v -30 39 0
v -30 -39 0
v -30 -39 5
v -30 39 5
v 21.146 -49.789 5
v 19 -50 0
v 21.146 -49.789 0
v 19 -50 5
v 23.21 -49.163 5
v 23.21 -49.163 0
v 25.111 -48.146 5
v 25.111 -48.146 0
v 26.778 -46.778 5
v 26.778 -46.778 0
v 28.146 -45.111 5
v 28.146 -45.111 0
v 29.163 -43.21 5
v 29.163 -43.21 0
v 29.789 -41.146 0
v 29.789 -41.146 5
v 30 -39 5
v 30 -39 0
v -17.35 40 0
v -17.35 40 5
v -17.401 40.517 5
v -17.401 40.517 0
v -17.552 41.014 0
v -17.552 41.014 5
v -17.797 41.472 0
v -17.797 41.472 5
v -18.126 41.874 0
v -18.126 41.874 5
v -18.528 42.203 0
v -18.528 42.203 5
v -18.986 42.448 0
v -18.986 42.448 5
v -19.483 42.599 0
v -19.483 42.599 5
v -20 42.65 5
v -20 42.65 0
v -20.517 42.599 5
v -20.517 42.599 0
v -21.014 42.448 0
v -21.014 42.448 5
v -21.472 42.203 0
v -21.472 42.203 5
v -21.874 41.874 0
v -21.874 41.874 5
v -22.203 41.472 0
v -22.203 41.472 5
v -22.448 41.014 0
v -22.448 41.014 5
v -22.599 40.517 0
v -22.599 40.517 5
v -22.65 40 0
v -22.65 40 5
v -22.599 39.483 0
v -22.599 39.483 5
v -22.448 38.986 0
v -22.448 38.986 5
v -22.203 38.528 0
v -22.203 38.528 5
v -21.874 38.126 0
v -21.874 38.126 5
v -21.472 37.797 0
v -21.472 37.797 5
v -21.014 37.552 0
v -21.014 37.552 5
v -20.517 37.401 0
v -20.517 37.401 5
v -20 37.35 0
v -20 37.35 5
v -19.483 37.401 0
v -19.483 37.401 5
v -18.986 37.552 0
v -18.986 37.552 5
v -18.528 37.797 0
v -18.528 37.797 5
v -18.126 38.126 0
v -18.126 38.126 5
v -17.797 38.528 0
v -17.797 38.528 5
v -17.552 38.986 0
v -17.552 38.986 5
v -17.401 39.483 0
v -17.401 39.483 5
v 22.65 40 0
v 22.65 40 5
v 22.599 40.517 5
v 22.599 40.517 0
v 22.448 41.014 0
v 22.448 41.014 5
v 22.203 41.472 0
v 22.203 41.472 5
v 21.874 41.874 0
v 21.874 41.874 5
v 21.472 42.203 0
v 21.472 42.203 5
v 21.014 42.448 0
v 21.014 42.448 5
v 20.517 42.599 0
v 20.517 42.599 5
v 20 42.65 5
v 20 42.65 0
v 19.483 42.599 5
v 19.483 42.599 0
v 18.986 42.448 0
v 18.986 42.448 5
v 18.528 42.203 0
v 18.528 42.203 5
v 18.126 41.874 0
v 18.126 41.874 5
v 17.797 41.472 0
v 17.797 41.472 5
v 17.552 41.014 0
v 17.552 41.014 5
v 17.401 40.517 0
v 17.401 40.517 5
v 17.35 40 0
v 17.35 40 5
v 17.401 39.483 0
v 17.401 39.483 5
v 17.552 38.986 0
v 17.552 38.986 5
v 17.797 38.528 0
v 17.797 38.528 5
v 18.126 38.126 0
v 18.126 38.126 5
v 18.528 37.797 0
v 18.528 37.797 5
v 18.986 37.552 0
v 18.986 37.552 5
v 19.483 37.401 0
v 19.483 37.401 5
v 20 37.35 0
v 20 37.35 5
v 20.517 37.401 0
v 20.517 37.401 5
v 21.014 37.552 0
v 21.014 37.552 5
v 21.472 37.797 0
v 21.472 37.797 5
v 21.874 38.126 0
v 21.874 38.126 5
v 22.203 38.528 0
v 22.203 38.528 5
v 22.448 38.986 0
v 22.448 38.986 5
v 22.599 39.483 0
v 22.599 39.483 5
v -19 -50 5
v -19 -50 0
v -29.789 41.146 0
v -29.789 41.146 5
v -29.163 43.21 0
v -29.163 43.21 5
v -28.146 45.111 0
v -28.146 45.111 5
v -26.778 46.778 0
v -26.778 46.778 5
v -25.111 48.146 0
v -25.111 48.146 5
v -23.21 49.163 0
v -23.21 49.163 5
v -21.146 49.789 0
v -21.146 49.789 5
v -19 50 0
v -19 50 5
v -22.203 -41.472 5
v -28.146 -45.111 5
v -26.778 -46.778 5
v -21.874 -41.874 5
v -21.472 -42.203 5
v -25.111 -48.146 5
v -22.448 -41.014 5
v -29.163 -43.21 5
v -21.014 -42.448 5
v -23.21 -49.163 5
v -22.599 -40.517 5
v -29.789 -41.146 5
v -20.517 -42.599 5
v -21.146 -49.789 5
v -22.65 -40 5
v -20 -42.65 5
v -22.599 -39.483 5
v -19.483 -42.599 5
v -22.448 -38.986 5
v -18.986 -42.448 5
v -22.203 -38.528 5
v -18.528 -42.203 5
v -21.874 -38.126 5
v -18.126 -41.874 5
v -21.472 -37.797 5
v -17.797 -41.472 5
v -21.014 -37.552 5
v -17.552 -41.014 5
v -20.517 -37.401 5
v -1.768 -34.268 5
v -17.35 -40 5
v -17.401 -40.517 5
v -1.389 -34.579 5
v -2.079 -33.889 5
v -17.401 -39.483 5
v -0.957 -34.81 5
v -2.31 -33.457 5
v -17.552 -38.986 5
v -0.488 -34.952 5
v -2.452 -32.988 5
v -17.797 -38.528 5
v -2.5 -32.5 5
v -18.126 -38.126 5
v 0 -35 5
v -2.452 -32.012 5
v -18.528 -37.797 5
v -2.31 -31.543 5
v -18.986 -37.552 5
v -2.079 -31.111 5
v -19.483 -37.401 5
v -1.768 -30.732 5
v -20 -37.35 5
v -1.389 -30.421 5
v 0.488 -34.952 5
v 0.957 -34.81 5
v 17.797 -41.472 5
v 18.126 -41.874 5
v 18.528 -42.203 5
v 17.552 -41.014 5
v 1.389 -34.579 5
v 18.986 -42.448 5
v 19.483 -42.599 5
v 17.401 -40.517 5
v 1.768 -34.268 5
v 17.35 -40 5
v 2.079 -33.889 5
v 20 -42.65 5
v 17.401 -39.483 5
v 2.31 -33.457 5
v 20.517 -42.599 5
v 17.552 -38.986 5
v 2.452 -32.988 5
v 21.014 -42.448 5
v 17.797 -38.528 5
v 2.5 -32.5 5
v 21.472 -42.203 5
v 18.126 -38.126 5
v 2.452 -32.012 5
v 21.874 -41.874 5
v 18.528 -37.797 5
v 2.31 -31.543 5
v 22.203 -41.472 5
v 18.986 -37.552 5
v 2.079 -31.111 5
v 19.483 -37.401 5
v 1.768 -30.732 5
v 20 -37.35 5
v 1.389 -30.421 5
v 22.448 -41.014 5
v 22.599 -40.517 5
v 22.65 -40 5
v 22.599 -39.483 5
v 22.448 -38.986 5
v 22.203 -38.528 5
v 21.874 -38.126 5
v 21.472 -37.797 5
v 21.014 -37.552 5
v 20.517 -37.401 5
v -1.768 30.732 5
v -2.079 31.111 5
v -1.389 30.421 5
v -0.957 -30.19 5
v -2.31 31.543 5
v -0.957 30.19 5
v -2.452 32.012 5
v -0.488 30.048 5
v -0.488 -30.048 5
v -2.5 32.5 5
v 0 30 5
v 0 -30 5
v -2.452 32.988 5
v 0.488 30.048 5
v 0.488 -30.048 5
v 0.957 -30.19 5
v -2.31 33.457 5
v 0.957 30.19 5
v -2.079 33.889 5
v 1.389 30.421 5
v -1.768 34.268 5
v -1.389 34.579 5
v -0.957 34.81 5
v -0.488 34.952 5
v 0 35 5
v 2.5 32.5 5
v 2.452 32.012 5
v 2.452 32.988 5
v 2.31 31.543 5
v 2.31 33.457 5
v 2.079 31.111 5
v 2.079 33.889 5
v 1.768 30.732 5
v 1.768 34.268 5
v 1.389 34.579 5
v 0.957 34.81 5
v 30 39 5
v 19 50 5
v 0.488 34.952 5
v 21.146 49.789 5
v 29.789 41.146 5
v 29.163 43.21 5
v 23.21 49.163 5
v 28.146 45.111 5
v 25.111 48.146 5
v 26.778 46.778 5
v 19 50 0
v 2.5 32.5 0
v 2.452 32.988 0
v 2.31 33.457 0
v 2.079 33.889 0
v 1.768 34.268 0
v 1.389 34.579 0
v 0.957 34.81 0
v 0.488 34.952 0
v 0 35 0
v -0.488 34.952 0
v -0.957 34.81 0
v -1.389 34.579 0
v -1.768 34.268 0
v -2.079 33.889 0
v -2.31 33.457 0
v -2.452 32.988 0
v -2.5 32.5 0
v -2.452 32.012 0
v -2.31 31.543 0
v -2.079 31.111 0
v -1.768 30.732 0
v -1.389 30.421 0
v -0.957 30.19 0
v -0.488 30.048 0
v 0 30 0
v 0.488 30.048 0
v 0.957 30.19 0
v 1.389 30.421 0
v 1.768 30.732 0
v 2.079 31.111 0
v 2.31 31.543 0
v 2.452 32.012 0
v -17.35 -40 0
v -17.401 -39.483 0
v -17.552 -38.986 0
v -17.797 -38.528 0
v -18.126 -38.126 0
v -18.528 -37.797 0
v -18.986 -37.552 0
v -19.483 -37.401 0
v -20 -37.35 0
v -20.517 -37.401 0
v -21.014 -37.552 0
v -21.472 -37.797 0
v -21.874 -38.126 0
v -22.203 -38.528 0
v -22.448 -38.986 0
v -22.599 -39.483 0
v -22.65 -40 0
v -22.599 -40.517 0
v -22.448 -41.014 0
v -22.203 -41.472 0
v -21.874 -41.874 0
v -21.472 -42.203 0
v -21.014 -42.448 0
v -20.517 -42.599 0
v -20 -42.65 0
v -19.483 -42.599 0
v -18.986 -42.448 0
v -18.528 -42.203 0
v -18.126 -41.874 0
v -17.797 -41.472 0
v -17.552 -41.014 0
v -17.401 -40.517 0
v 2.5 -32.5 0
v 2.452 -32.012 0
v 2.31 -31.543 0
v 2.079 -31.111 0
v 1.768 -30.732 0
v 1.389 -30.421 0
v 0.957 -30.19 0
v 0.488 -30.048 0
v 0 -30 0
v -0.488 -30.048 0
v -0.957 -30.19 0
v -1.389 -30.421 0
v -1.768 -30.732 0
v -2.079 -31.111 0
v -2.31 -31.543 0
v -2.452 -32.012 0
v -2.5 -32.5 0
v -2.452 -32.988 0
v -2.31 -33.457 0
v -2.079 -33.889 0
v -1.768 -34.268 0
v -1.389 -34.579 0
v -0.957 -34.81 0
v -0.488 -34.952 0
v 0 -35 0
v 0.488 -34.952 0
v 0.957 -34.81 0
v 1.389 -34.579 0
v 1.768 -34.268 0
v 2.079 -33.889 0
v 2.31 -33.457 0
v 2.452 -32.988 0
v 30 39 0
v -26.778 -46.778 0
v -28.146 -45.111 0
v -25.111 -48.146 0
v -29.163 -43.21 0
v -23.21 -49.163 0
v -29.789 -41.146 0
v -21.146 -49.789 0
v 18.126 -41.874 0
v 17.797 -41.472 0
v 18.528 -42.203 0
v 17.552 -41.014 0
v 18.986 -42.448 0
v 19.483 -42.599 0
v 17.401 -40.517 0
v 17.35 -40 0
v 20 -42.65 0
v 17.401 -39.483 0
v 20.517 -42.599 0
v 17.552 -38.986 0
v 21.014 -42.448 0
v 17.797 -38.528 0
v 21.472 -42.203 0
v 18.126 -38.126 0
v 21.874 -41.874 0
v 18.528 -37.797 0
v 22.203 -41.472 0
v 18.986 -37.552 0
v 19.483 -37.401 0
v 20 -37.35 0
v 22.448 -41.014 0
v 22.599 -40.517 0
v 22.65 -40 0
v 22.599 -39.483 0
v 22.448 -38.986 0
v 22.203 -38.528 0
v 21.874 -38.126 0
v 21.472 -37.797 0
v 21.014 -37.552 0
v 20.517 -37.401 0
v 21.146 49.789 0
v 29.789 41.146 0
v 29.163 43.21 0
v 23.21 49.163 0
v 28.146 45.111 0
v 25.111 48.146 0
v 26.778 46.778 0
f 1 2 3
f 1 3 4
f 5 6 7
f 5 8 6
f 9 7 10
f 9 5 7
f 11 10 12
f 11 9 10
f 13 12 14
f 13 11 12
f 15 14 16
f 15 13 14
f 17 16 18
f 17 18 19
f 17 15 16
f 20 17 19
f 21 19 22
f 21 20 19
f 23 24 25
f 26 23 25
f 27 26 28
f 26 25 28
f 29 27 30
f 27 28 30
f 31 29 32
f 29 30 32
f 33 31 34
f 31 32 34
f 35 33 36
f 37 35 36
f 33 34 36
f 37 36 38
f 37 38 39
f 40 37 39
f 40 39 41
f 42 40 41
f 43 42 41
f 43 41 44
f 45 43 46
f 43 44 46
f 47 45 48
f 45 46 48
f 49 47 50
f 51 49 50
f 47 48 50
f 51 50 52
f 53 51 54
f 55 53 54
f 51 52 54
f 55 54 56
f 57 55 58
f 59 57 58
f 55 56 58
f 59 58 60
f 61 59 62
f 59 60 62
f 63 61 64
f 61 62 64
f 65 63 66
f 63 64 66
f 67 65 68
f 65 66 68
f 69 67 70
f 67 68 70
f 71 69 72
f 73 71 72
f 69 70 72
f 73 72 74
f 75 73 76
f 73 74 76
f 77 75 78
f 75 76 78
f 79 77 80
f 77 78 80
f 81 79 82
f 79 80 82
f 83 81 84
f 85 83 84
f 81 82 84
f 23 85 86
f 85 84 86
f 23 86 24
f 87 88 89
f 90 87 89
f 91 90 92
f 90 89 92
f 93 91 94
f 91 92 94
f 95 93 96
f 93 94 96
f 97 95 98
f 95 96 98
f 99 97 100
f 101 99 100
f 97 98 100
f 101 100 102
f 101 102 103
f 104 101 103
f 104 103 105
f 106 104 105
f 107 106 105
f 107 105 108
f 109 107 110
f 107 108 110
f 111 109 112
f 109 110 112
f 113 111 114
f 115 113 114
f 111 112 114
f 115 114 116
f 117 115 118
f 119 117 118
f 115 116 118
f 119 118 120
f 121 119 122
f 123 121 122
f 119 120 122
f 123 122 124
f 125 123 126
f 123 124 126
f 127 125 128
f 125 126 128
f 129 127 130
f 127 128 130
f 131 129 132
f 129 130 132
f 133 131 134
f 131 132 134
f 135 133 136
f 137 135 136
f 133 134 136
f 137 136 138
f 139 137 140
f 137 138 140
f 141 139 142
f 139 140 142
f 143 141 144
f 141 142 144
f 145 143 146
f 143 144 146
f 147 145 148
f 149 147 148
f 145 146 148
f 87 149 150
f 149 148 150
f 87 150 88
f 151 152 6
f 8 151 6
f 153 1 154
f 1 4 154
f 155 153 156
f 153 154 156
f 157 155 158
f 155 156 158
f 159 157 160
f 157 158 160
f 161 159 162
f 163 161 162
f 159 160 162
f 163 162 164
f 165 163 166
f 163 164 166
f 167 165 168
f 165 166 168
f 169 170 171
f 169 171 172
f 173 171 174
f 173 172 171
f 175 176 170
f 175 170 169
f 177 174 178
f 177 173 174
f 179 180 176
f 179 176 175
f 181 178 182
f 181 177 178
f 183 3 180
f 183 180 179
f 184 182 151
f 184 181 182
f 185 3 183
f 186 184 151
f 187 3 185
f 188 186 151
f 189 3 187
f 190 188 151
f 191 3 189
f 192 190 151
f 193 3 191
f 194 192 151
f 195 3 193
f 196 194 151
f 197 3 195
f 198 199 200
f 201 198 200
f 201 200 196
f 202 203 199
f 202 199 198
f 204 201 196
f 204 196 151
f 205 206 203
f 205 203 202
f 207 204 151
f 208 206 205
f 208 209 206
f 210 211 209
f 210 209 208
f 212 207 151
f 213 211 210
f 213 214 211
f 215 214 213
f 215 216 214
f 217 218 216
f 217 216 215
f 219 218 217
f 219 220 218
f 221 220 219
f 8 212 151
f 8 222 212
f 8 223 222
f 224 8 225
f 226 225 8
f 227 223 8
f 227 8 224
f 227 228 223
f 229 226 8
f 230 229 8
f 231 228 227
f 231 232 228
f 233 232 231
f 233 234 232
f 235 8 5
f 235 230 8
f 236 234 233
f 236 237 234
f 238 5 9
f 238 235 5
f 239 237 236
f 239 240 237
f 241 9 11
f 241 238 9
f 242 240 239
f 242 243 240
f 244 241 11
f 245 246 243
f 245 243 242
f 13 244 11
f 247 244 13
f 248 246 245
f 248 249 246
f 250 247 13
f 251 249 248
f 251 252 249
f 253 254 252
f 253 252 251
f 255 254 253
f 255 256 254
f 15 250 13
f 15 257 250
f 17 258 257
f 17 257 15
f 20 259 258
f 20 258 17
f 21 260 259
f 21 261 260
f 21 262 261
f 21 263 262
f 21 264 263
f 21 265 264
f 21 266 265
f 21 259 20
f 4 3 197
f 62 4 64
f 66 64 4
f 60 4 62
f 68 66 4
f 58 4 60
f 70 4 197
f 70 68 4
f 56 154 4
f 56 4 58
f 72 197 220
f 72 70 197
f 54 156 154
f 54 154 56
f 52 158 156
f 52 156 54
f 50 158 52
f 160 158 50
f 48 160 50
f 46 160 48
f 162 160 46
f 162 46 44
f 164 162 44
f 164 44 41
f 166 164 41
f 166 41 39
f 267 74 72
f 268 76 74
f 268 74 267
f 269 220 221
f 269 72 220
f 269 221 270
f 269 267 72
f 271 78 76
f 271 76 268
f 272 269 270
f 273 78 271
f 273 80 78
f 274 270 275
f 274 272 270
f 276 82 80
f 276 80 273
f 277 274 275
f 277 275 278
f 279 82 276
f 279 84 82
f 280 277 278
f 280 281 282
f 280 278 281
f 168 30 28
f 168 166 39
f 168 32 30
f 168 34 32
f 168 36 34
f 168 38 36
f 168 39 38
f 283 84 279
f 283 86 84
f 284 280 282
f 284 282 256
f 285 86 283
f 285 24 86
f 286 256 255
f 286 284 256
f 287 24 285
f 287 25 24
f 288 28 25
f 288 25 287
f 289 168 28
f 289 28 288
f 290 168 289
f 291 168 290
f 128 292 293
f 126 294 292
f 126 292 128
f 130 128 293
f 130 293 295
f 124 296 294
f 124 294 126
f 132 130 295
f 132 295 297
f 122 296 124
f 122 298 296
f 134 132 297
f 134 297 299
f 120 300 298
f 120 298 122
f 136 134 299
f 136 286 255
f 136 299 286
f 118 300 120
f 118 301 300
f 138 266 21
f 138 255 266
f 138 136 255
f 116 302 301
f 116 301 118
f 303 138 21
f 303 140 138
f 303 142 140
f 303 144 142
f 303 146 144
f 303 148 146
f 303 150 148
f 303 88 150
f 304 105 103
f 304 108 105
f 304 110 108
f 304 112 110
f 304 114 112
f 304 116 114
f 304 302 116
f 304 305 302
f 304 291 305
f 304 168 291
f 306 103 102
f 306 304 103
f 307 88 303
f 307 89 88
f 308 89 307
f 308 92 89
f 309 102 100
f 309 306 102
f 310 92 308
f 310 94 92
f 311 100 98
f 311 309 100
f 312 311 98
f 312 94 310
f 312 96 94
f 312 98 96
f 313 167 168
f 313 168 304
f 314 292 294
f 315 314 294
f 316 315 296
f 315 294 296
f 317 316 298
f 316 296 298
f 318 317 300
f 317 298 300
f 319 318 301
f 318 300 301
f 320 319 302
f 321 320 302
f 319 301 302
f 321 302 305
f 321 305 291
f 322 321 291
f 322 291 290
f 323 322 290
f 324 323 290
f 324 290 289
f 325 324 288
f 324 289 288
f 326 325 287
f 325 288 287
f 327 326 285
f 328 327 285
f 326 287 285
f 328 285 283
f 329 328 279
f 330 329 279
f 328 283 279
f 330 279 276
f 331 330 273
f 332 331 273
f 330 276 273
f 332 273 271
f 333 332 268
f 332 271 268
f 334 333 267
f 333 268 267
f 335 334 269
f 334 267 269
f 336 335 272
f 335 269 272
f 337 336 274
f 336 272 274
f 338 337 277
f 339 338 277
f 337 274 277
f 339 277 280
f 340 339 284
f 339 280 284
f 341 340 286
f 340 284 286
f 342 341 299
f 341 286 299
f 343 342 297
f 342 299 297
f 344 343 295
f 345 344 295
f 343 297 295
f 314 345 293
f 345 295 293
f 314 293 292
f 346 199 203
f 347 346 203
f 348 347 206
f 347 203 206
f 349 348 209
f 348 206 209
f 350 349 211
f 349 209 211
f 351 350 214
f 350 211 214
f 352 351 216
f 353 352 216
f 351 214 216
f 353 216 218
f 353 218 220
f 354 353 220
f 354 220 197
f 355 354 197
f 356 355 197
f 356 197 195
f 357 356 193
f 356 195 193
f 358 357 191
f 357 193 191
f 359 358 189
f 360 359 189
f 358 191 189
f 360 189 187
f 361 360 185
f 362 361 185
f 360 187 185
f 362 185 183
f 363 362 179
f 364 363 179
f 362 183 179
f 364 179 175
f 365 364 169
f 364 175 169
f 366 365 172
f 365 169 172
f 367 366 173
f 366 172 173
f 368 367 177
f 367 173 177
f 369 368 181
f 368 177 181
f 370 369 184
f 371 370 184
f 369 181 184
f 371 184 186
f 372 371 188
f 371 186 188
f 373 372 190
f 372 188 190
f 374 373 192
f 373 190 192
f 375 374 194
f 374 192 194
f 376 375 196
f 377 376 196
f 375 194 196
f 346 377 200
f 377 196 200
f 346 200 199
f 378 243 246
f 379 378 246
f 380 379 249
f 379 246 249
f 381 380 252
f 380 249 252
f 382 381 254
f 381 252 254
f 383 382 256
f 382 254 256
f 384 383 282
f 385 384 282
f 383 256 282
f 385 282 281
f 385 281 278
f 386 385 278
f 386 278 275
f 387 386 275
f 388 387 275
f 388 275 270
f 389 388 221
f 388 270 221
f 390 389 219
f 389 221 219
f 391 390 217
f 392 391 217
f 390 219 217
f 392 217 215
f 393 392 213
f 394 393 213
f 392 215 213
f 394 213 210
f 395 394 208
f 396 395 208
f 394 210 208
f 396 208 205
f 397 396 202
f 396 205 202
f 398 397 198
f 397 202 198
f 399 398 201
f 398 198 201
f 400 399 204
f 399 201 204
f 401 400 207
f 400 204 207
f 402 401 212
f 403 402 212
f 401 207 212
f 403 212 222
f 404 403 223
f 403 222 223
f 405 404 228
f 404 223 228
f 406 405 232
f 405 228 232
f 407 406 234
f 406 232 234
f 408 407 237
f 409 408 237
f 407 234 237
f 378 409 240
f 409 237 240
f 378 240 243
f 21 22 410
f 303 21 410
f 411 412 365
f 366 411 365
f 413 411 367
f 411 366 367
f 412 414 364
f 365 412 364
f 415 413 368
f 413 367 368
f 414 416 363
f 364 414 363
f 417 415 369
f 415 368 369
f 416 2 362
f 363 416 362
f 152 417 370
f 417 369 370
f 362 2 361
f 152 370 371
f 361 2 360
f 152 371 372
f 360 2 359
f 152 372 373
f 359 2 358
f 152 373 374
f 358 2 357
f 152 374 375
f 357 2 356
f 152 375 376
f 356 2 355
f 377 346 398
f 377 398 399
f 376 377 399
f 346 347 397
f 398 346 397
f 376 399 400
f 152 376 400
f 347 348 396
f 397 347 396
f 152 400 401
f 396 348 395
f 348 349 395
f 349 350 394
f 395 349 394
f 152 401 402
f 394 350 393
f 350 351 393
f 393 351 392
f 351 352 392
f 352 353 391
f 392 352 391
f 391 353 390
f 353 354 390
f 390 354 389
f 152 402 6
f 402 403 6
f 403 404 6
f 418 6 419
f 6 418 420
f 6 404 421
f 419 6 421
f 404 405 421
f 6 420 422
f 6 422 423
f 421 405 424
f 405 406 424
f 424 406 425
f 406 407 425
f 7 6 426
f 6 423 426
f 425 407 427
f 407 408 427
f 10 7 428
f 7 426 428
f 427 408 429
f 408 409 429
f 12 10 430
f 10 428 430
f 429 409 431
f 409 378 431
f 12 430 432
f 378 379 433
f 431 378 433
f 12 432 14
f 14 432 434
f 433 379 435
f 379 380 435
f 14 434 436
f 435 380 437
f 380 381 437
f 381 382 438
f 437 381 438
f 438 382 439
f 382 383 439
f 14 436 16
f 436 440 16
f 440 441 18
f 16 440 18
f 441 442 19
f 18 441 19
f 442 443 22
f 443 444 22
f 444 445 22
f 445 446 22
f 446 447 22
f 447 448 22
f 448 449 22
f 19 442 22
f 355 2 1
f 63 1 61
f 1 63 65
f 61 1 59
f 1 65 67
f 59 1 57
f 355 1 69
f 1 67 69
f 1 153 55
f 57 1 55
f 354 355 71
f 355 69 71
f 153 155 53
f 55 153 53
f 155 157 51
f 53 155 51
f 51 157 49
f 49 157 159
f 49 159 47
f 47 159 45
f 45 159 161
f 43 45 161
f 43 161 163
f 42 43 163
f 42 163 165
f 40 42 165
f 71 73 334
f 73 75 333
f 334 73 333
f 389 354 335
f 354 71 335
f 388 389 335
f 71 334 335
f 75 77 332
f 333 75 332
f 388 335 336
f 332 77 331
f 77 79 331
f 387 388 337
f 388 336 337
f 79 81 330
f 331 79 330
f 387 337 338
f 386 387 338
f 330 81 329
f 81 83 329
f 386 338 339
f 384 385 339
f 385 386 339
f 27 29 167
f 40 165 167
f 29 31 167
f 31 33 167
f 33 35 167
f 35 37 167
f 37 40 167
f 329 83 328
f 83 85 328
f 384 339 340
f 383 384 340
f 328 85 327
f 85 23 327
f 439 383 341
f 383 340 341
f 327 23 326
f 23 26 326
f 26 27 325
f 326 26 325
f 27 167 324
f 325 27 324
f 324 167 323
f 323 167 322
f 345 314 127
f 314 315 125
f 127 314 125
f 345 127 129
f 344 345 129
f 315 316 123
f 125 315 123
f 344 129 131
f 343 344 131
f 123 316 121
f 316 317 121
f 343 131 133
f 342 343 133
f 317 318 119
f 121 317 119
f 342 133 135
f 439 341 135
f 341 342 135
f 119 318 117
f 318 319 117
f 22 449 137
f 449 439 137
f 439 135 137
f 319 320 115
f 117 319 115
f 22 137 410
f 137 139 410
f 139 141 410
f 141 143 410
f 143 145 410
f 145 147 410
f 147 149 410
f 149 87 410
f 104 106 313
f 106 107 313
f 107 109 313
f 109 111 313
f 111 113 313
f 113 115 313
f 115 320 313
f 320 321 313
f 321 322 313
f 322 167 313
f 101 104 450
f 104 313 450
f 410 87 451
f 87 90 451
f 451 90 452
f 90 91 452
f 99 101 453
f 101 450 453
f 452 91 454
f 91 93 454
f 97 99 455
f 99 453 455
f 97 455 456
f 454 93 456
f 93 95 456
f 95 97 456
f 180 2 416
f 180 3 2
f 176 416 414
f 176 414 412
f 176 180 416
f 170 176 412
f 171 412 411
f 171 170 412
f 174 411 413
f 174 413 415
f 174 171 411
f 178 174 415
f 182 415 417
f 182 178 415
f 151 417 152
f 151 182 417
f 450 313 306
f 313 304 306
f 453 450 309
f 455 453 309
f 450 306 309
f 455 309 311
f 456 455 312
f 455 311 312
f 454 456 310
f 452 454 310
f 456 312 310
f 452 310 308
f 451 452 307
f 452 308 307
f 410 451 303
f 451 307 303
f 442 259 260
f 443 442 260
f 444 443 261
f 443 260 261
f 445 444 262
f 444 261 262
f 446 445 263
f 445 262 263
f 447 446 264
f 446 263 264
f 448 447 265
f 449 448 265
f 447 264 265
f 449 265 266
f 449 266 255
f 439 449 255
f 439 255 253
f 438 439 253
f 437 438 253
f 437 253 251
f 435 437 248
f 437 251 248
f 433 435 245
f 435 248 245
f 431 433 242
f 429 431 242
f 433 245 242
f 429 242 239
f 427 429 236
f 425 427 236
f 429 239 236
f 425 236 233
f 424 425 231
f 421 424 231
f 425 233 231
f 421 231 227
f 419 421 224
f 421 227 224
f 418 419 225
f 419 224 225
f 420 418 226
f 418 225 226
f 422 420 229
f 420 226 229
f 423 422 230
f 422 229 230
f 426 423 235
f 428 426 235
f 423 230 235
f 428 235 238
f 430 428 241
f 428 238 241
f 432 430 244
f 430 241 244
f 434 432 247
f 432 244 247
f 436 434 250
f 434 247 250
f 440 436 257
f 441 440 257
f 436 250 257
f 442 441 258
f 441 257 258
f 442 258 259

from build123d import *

# Parameters (mm, degrees)
SKETCH_W        = 60
SKETCH_H        = 100
PAD_DEPTH       = 5
SKETCH001_R     = 2.65
POCKET_DEPTH    = 5
FILLET_R        = 11
SKETCH002_R     = 2.5
POCKET001_DEPTH = 5


with BuildPart() as part:
    # Sketch → Pad (new body)
    with BuildSketch(Plane.XY):
        Rectangle(SKETCH_W, SKETCH_H)
    extrude(amount=PAD_DEPTH)

    # Sketch001 (on Face6 of Pad) → Pocket (cut)
    with BuildSketch(Plane.XY.offset(5)):
        with Locations((-20, 40)):
            Circle(SKETCH001_R)
        with Locations((20, 40)):
            Circle(SKETCH001_R)
        with Locations((-20, -40)):
            Circle(SKETCH001_R)
        with Locations((20, -40)):
            Circle(SKETCH001_R)
    extrude(amount=-POCKET_DEPTH, mode=Mode.SUBTRACT)

    # Fillet
    fillet_edges = [part.edges().sort_by_distance(p)[0] for p in [
        (30, 50, 2.5),
        (30, -50, 2.5),
        (-30, 50, 2.5),
        (-30, -50, 2.5),
    ]]
    fillet(fillet_edges, radius=FILLET_R)

    # Sketch002 (on Face5 of Fillet) → Pocket001 (cut)
    with BuildSketch(Plane.XY.offset(5)):
        with Locations((0, 32.5)):
            Circle(SKETCH002_R)
        with Locations((0, -32.5)):
            Circle(SKETCH002_R)
    extrude(amount=-POCKET001_DEPTH, mode=Mode.SUBTRACT)


solid = part.part
